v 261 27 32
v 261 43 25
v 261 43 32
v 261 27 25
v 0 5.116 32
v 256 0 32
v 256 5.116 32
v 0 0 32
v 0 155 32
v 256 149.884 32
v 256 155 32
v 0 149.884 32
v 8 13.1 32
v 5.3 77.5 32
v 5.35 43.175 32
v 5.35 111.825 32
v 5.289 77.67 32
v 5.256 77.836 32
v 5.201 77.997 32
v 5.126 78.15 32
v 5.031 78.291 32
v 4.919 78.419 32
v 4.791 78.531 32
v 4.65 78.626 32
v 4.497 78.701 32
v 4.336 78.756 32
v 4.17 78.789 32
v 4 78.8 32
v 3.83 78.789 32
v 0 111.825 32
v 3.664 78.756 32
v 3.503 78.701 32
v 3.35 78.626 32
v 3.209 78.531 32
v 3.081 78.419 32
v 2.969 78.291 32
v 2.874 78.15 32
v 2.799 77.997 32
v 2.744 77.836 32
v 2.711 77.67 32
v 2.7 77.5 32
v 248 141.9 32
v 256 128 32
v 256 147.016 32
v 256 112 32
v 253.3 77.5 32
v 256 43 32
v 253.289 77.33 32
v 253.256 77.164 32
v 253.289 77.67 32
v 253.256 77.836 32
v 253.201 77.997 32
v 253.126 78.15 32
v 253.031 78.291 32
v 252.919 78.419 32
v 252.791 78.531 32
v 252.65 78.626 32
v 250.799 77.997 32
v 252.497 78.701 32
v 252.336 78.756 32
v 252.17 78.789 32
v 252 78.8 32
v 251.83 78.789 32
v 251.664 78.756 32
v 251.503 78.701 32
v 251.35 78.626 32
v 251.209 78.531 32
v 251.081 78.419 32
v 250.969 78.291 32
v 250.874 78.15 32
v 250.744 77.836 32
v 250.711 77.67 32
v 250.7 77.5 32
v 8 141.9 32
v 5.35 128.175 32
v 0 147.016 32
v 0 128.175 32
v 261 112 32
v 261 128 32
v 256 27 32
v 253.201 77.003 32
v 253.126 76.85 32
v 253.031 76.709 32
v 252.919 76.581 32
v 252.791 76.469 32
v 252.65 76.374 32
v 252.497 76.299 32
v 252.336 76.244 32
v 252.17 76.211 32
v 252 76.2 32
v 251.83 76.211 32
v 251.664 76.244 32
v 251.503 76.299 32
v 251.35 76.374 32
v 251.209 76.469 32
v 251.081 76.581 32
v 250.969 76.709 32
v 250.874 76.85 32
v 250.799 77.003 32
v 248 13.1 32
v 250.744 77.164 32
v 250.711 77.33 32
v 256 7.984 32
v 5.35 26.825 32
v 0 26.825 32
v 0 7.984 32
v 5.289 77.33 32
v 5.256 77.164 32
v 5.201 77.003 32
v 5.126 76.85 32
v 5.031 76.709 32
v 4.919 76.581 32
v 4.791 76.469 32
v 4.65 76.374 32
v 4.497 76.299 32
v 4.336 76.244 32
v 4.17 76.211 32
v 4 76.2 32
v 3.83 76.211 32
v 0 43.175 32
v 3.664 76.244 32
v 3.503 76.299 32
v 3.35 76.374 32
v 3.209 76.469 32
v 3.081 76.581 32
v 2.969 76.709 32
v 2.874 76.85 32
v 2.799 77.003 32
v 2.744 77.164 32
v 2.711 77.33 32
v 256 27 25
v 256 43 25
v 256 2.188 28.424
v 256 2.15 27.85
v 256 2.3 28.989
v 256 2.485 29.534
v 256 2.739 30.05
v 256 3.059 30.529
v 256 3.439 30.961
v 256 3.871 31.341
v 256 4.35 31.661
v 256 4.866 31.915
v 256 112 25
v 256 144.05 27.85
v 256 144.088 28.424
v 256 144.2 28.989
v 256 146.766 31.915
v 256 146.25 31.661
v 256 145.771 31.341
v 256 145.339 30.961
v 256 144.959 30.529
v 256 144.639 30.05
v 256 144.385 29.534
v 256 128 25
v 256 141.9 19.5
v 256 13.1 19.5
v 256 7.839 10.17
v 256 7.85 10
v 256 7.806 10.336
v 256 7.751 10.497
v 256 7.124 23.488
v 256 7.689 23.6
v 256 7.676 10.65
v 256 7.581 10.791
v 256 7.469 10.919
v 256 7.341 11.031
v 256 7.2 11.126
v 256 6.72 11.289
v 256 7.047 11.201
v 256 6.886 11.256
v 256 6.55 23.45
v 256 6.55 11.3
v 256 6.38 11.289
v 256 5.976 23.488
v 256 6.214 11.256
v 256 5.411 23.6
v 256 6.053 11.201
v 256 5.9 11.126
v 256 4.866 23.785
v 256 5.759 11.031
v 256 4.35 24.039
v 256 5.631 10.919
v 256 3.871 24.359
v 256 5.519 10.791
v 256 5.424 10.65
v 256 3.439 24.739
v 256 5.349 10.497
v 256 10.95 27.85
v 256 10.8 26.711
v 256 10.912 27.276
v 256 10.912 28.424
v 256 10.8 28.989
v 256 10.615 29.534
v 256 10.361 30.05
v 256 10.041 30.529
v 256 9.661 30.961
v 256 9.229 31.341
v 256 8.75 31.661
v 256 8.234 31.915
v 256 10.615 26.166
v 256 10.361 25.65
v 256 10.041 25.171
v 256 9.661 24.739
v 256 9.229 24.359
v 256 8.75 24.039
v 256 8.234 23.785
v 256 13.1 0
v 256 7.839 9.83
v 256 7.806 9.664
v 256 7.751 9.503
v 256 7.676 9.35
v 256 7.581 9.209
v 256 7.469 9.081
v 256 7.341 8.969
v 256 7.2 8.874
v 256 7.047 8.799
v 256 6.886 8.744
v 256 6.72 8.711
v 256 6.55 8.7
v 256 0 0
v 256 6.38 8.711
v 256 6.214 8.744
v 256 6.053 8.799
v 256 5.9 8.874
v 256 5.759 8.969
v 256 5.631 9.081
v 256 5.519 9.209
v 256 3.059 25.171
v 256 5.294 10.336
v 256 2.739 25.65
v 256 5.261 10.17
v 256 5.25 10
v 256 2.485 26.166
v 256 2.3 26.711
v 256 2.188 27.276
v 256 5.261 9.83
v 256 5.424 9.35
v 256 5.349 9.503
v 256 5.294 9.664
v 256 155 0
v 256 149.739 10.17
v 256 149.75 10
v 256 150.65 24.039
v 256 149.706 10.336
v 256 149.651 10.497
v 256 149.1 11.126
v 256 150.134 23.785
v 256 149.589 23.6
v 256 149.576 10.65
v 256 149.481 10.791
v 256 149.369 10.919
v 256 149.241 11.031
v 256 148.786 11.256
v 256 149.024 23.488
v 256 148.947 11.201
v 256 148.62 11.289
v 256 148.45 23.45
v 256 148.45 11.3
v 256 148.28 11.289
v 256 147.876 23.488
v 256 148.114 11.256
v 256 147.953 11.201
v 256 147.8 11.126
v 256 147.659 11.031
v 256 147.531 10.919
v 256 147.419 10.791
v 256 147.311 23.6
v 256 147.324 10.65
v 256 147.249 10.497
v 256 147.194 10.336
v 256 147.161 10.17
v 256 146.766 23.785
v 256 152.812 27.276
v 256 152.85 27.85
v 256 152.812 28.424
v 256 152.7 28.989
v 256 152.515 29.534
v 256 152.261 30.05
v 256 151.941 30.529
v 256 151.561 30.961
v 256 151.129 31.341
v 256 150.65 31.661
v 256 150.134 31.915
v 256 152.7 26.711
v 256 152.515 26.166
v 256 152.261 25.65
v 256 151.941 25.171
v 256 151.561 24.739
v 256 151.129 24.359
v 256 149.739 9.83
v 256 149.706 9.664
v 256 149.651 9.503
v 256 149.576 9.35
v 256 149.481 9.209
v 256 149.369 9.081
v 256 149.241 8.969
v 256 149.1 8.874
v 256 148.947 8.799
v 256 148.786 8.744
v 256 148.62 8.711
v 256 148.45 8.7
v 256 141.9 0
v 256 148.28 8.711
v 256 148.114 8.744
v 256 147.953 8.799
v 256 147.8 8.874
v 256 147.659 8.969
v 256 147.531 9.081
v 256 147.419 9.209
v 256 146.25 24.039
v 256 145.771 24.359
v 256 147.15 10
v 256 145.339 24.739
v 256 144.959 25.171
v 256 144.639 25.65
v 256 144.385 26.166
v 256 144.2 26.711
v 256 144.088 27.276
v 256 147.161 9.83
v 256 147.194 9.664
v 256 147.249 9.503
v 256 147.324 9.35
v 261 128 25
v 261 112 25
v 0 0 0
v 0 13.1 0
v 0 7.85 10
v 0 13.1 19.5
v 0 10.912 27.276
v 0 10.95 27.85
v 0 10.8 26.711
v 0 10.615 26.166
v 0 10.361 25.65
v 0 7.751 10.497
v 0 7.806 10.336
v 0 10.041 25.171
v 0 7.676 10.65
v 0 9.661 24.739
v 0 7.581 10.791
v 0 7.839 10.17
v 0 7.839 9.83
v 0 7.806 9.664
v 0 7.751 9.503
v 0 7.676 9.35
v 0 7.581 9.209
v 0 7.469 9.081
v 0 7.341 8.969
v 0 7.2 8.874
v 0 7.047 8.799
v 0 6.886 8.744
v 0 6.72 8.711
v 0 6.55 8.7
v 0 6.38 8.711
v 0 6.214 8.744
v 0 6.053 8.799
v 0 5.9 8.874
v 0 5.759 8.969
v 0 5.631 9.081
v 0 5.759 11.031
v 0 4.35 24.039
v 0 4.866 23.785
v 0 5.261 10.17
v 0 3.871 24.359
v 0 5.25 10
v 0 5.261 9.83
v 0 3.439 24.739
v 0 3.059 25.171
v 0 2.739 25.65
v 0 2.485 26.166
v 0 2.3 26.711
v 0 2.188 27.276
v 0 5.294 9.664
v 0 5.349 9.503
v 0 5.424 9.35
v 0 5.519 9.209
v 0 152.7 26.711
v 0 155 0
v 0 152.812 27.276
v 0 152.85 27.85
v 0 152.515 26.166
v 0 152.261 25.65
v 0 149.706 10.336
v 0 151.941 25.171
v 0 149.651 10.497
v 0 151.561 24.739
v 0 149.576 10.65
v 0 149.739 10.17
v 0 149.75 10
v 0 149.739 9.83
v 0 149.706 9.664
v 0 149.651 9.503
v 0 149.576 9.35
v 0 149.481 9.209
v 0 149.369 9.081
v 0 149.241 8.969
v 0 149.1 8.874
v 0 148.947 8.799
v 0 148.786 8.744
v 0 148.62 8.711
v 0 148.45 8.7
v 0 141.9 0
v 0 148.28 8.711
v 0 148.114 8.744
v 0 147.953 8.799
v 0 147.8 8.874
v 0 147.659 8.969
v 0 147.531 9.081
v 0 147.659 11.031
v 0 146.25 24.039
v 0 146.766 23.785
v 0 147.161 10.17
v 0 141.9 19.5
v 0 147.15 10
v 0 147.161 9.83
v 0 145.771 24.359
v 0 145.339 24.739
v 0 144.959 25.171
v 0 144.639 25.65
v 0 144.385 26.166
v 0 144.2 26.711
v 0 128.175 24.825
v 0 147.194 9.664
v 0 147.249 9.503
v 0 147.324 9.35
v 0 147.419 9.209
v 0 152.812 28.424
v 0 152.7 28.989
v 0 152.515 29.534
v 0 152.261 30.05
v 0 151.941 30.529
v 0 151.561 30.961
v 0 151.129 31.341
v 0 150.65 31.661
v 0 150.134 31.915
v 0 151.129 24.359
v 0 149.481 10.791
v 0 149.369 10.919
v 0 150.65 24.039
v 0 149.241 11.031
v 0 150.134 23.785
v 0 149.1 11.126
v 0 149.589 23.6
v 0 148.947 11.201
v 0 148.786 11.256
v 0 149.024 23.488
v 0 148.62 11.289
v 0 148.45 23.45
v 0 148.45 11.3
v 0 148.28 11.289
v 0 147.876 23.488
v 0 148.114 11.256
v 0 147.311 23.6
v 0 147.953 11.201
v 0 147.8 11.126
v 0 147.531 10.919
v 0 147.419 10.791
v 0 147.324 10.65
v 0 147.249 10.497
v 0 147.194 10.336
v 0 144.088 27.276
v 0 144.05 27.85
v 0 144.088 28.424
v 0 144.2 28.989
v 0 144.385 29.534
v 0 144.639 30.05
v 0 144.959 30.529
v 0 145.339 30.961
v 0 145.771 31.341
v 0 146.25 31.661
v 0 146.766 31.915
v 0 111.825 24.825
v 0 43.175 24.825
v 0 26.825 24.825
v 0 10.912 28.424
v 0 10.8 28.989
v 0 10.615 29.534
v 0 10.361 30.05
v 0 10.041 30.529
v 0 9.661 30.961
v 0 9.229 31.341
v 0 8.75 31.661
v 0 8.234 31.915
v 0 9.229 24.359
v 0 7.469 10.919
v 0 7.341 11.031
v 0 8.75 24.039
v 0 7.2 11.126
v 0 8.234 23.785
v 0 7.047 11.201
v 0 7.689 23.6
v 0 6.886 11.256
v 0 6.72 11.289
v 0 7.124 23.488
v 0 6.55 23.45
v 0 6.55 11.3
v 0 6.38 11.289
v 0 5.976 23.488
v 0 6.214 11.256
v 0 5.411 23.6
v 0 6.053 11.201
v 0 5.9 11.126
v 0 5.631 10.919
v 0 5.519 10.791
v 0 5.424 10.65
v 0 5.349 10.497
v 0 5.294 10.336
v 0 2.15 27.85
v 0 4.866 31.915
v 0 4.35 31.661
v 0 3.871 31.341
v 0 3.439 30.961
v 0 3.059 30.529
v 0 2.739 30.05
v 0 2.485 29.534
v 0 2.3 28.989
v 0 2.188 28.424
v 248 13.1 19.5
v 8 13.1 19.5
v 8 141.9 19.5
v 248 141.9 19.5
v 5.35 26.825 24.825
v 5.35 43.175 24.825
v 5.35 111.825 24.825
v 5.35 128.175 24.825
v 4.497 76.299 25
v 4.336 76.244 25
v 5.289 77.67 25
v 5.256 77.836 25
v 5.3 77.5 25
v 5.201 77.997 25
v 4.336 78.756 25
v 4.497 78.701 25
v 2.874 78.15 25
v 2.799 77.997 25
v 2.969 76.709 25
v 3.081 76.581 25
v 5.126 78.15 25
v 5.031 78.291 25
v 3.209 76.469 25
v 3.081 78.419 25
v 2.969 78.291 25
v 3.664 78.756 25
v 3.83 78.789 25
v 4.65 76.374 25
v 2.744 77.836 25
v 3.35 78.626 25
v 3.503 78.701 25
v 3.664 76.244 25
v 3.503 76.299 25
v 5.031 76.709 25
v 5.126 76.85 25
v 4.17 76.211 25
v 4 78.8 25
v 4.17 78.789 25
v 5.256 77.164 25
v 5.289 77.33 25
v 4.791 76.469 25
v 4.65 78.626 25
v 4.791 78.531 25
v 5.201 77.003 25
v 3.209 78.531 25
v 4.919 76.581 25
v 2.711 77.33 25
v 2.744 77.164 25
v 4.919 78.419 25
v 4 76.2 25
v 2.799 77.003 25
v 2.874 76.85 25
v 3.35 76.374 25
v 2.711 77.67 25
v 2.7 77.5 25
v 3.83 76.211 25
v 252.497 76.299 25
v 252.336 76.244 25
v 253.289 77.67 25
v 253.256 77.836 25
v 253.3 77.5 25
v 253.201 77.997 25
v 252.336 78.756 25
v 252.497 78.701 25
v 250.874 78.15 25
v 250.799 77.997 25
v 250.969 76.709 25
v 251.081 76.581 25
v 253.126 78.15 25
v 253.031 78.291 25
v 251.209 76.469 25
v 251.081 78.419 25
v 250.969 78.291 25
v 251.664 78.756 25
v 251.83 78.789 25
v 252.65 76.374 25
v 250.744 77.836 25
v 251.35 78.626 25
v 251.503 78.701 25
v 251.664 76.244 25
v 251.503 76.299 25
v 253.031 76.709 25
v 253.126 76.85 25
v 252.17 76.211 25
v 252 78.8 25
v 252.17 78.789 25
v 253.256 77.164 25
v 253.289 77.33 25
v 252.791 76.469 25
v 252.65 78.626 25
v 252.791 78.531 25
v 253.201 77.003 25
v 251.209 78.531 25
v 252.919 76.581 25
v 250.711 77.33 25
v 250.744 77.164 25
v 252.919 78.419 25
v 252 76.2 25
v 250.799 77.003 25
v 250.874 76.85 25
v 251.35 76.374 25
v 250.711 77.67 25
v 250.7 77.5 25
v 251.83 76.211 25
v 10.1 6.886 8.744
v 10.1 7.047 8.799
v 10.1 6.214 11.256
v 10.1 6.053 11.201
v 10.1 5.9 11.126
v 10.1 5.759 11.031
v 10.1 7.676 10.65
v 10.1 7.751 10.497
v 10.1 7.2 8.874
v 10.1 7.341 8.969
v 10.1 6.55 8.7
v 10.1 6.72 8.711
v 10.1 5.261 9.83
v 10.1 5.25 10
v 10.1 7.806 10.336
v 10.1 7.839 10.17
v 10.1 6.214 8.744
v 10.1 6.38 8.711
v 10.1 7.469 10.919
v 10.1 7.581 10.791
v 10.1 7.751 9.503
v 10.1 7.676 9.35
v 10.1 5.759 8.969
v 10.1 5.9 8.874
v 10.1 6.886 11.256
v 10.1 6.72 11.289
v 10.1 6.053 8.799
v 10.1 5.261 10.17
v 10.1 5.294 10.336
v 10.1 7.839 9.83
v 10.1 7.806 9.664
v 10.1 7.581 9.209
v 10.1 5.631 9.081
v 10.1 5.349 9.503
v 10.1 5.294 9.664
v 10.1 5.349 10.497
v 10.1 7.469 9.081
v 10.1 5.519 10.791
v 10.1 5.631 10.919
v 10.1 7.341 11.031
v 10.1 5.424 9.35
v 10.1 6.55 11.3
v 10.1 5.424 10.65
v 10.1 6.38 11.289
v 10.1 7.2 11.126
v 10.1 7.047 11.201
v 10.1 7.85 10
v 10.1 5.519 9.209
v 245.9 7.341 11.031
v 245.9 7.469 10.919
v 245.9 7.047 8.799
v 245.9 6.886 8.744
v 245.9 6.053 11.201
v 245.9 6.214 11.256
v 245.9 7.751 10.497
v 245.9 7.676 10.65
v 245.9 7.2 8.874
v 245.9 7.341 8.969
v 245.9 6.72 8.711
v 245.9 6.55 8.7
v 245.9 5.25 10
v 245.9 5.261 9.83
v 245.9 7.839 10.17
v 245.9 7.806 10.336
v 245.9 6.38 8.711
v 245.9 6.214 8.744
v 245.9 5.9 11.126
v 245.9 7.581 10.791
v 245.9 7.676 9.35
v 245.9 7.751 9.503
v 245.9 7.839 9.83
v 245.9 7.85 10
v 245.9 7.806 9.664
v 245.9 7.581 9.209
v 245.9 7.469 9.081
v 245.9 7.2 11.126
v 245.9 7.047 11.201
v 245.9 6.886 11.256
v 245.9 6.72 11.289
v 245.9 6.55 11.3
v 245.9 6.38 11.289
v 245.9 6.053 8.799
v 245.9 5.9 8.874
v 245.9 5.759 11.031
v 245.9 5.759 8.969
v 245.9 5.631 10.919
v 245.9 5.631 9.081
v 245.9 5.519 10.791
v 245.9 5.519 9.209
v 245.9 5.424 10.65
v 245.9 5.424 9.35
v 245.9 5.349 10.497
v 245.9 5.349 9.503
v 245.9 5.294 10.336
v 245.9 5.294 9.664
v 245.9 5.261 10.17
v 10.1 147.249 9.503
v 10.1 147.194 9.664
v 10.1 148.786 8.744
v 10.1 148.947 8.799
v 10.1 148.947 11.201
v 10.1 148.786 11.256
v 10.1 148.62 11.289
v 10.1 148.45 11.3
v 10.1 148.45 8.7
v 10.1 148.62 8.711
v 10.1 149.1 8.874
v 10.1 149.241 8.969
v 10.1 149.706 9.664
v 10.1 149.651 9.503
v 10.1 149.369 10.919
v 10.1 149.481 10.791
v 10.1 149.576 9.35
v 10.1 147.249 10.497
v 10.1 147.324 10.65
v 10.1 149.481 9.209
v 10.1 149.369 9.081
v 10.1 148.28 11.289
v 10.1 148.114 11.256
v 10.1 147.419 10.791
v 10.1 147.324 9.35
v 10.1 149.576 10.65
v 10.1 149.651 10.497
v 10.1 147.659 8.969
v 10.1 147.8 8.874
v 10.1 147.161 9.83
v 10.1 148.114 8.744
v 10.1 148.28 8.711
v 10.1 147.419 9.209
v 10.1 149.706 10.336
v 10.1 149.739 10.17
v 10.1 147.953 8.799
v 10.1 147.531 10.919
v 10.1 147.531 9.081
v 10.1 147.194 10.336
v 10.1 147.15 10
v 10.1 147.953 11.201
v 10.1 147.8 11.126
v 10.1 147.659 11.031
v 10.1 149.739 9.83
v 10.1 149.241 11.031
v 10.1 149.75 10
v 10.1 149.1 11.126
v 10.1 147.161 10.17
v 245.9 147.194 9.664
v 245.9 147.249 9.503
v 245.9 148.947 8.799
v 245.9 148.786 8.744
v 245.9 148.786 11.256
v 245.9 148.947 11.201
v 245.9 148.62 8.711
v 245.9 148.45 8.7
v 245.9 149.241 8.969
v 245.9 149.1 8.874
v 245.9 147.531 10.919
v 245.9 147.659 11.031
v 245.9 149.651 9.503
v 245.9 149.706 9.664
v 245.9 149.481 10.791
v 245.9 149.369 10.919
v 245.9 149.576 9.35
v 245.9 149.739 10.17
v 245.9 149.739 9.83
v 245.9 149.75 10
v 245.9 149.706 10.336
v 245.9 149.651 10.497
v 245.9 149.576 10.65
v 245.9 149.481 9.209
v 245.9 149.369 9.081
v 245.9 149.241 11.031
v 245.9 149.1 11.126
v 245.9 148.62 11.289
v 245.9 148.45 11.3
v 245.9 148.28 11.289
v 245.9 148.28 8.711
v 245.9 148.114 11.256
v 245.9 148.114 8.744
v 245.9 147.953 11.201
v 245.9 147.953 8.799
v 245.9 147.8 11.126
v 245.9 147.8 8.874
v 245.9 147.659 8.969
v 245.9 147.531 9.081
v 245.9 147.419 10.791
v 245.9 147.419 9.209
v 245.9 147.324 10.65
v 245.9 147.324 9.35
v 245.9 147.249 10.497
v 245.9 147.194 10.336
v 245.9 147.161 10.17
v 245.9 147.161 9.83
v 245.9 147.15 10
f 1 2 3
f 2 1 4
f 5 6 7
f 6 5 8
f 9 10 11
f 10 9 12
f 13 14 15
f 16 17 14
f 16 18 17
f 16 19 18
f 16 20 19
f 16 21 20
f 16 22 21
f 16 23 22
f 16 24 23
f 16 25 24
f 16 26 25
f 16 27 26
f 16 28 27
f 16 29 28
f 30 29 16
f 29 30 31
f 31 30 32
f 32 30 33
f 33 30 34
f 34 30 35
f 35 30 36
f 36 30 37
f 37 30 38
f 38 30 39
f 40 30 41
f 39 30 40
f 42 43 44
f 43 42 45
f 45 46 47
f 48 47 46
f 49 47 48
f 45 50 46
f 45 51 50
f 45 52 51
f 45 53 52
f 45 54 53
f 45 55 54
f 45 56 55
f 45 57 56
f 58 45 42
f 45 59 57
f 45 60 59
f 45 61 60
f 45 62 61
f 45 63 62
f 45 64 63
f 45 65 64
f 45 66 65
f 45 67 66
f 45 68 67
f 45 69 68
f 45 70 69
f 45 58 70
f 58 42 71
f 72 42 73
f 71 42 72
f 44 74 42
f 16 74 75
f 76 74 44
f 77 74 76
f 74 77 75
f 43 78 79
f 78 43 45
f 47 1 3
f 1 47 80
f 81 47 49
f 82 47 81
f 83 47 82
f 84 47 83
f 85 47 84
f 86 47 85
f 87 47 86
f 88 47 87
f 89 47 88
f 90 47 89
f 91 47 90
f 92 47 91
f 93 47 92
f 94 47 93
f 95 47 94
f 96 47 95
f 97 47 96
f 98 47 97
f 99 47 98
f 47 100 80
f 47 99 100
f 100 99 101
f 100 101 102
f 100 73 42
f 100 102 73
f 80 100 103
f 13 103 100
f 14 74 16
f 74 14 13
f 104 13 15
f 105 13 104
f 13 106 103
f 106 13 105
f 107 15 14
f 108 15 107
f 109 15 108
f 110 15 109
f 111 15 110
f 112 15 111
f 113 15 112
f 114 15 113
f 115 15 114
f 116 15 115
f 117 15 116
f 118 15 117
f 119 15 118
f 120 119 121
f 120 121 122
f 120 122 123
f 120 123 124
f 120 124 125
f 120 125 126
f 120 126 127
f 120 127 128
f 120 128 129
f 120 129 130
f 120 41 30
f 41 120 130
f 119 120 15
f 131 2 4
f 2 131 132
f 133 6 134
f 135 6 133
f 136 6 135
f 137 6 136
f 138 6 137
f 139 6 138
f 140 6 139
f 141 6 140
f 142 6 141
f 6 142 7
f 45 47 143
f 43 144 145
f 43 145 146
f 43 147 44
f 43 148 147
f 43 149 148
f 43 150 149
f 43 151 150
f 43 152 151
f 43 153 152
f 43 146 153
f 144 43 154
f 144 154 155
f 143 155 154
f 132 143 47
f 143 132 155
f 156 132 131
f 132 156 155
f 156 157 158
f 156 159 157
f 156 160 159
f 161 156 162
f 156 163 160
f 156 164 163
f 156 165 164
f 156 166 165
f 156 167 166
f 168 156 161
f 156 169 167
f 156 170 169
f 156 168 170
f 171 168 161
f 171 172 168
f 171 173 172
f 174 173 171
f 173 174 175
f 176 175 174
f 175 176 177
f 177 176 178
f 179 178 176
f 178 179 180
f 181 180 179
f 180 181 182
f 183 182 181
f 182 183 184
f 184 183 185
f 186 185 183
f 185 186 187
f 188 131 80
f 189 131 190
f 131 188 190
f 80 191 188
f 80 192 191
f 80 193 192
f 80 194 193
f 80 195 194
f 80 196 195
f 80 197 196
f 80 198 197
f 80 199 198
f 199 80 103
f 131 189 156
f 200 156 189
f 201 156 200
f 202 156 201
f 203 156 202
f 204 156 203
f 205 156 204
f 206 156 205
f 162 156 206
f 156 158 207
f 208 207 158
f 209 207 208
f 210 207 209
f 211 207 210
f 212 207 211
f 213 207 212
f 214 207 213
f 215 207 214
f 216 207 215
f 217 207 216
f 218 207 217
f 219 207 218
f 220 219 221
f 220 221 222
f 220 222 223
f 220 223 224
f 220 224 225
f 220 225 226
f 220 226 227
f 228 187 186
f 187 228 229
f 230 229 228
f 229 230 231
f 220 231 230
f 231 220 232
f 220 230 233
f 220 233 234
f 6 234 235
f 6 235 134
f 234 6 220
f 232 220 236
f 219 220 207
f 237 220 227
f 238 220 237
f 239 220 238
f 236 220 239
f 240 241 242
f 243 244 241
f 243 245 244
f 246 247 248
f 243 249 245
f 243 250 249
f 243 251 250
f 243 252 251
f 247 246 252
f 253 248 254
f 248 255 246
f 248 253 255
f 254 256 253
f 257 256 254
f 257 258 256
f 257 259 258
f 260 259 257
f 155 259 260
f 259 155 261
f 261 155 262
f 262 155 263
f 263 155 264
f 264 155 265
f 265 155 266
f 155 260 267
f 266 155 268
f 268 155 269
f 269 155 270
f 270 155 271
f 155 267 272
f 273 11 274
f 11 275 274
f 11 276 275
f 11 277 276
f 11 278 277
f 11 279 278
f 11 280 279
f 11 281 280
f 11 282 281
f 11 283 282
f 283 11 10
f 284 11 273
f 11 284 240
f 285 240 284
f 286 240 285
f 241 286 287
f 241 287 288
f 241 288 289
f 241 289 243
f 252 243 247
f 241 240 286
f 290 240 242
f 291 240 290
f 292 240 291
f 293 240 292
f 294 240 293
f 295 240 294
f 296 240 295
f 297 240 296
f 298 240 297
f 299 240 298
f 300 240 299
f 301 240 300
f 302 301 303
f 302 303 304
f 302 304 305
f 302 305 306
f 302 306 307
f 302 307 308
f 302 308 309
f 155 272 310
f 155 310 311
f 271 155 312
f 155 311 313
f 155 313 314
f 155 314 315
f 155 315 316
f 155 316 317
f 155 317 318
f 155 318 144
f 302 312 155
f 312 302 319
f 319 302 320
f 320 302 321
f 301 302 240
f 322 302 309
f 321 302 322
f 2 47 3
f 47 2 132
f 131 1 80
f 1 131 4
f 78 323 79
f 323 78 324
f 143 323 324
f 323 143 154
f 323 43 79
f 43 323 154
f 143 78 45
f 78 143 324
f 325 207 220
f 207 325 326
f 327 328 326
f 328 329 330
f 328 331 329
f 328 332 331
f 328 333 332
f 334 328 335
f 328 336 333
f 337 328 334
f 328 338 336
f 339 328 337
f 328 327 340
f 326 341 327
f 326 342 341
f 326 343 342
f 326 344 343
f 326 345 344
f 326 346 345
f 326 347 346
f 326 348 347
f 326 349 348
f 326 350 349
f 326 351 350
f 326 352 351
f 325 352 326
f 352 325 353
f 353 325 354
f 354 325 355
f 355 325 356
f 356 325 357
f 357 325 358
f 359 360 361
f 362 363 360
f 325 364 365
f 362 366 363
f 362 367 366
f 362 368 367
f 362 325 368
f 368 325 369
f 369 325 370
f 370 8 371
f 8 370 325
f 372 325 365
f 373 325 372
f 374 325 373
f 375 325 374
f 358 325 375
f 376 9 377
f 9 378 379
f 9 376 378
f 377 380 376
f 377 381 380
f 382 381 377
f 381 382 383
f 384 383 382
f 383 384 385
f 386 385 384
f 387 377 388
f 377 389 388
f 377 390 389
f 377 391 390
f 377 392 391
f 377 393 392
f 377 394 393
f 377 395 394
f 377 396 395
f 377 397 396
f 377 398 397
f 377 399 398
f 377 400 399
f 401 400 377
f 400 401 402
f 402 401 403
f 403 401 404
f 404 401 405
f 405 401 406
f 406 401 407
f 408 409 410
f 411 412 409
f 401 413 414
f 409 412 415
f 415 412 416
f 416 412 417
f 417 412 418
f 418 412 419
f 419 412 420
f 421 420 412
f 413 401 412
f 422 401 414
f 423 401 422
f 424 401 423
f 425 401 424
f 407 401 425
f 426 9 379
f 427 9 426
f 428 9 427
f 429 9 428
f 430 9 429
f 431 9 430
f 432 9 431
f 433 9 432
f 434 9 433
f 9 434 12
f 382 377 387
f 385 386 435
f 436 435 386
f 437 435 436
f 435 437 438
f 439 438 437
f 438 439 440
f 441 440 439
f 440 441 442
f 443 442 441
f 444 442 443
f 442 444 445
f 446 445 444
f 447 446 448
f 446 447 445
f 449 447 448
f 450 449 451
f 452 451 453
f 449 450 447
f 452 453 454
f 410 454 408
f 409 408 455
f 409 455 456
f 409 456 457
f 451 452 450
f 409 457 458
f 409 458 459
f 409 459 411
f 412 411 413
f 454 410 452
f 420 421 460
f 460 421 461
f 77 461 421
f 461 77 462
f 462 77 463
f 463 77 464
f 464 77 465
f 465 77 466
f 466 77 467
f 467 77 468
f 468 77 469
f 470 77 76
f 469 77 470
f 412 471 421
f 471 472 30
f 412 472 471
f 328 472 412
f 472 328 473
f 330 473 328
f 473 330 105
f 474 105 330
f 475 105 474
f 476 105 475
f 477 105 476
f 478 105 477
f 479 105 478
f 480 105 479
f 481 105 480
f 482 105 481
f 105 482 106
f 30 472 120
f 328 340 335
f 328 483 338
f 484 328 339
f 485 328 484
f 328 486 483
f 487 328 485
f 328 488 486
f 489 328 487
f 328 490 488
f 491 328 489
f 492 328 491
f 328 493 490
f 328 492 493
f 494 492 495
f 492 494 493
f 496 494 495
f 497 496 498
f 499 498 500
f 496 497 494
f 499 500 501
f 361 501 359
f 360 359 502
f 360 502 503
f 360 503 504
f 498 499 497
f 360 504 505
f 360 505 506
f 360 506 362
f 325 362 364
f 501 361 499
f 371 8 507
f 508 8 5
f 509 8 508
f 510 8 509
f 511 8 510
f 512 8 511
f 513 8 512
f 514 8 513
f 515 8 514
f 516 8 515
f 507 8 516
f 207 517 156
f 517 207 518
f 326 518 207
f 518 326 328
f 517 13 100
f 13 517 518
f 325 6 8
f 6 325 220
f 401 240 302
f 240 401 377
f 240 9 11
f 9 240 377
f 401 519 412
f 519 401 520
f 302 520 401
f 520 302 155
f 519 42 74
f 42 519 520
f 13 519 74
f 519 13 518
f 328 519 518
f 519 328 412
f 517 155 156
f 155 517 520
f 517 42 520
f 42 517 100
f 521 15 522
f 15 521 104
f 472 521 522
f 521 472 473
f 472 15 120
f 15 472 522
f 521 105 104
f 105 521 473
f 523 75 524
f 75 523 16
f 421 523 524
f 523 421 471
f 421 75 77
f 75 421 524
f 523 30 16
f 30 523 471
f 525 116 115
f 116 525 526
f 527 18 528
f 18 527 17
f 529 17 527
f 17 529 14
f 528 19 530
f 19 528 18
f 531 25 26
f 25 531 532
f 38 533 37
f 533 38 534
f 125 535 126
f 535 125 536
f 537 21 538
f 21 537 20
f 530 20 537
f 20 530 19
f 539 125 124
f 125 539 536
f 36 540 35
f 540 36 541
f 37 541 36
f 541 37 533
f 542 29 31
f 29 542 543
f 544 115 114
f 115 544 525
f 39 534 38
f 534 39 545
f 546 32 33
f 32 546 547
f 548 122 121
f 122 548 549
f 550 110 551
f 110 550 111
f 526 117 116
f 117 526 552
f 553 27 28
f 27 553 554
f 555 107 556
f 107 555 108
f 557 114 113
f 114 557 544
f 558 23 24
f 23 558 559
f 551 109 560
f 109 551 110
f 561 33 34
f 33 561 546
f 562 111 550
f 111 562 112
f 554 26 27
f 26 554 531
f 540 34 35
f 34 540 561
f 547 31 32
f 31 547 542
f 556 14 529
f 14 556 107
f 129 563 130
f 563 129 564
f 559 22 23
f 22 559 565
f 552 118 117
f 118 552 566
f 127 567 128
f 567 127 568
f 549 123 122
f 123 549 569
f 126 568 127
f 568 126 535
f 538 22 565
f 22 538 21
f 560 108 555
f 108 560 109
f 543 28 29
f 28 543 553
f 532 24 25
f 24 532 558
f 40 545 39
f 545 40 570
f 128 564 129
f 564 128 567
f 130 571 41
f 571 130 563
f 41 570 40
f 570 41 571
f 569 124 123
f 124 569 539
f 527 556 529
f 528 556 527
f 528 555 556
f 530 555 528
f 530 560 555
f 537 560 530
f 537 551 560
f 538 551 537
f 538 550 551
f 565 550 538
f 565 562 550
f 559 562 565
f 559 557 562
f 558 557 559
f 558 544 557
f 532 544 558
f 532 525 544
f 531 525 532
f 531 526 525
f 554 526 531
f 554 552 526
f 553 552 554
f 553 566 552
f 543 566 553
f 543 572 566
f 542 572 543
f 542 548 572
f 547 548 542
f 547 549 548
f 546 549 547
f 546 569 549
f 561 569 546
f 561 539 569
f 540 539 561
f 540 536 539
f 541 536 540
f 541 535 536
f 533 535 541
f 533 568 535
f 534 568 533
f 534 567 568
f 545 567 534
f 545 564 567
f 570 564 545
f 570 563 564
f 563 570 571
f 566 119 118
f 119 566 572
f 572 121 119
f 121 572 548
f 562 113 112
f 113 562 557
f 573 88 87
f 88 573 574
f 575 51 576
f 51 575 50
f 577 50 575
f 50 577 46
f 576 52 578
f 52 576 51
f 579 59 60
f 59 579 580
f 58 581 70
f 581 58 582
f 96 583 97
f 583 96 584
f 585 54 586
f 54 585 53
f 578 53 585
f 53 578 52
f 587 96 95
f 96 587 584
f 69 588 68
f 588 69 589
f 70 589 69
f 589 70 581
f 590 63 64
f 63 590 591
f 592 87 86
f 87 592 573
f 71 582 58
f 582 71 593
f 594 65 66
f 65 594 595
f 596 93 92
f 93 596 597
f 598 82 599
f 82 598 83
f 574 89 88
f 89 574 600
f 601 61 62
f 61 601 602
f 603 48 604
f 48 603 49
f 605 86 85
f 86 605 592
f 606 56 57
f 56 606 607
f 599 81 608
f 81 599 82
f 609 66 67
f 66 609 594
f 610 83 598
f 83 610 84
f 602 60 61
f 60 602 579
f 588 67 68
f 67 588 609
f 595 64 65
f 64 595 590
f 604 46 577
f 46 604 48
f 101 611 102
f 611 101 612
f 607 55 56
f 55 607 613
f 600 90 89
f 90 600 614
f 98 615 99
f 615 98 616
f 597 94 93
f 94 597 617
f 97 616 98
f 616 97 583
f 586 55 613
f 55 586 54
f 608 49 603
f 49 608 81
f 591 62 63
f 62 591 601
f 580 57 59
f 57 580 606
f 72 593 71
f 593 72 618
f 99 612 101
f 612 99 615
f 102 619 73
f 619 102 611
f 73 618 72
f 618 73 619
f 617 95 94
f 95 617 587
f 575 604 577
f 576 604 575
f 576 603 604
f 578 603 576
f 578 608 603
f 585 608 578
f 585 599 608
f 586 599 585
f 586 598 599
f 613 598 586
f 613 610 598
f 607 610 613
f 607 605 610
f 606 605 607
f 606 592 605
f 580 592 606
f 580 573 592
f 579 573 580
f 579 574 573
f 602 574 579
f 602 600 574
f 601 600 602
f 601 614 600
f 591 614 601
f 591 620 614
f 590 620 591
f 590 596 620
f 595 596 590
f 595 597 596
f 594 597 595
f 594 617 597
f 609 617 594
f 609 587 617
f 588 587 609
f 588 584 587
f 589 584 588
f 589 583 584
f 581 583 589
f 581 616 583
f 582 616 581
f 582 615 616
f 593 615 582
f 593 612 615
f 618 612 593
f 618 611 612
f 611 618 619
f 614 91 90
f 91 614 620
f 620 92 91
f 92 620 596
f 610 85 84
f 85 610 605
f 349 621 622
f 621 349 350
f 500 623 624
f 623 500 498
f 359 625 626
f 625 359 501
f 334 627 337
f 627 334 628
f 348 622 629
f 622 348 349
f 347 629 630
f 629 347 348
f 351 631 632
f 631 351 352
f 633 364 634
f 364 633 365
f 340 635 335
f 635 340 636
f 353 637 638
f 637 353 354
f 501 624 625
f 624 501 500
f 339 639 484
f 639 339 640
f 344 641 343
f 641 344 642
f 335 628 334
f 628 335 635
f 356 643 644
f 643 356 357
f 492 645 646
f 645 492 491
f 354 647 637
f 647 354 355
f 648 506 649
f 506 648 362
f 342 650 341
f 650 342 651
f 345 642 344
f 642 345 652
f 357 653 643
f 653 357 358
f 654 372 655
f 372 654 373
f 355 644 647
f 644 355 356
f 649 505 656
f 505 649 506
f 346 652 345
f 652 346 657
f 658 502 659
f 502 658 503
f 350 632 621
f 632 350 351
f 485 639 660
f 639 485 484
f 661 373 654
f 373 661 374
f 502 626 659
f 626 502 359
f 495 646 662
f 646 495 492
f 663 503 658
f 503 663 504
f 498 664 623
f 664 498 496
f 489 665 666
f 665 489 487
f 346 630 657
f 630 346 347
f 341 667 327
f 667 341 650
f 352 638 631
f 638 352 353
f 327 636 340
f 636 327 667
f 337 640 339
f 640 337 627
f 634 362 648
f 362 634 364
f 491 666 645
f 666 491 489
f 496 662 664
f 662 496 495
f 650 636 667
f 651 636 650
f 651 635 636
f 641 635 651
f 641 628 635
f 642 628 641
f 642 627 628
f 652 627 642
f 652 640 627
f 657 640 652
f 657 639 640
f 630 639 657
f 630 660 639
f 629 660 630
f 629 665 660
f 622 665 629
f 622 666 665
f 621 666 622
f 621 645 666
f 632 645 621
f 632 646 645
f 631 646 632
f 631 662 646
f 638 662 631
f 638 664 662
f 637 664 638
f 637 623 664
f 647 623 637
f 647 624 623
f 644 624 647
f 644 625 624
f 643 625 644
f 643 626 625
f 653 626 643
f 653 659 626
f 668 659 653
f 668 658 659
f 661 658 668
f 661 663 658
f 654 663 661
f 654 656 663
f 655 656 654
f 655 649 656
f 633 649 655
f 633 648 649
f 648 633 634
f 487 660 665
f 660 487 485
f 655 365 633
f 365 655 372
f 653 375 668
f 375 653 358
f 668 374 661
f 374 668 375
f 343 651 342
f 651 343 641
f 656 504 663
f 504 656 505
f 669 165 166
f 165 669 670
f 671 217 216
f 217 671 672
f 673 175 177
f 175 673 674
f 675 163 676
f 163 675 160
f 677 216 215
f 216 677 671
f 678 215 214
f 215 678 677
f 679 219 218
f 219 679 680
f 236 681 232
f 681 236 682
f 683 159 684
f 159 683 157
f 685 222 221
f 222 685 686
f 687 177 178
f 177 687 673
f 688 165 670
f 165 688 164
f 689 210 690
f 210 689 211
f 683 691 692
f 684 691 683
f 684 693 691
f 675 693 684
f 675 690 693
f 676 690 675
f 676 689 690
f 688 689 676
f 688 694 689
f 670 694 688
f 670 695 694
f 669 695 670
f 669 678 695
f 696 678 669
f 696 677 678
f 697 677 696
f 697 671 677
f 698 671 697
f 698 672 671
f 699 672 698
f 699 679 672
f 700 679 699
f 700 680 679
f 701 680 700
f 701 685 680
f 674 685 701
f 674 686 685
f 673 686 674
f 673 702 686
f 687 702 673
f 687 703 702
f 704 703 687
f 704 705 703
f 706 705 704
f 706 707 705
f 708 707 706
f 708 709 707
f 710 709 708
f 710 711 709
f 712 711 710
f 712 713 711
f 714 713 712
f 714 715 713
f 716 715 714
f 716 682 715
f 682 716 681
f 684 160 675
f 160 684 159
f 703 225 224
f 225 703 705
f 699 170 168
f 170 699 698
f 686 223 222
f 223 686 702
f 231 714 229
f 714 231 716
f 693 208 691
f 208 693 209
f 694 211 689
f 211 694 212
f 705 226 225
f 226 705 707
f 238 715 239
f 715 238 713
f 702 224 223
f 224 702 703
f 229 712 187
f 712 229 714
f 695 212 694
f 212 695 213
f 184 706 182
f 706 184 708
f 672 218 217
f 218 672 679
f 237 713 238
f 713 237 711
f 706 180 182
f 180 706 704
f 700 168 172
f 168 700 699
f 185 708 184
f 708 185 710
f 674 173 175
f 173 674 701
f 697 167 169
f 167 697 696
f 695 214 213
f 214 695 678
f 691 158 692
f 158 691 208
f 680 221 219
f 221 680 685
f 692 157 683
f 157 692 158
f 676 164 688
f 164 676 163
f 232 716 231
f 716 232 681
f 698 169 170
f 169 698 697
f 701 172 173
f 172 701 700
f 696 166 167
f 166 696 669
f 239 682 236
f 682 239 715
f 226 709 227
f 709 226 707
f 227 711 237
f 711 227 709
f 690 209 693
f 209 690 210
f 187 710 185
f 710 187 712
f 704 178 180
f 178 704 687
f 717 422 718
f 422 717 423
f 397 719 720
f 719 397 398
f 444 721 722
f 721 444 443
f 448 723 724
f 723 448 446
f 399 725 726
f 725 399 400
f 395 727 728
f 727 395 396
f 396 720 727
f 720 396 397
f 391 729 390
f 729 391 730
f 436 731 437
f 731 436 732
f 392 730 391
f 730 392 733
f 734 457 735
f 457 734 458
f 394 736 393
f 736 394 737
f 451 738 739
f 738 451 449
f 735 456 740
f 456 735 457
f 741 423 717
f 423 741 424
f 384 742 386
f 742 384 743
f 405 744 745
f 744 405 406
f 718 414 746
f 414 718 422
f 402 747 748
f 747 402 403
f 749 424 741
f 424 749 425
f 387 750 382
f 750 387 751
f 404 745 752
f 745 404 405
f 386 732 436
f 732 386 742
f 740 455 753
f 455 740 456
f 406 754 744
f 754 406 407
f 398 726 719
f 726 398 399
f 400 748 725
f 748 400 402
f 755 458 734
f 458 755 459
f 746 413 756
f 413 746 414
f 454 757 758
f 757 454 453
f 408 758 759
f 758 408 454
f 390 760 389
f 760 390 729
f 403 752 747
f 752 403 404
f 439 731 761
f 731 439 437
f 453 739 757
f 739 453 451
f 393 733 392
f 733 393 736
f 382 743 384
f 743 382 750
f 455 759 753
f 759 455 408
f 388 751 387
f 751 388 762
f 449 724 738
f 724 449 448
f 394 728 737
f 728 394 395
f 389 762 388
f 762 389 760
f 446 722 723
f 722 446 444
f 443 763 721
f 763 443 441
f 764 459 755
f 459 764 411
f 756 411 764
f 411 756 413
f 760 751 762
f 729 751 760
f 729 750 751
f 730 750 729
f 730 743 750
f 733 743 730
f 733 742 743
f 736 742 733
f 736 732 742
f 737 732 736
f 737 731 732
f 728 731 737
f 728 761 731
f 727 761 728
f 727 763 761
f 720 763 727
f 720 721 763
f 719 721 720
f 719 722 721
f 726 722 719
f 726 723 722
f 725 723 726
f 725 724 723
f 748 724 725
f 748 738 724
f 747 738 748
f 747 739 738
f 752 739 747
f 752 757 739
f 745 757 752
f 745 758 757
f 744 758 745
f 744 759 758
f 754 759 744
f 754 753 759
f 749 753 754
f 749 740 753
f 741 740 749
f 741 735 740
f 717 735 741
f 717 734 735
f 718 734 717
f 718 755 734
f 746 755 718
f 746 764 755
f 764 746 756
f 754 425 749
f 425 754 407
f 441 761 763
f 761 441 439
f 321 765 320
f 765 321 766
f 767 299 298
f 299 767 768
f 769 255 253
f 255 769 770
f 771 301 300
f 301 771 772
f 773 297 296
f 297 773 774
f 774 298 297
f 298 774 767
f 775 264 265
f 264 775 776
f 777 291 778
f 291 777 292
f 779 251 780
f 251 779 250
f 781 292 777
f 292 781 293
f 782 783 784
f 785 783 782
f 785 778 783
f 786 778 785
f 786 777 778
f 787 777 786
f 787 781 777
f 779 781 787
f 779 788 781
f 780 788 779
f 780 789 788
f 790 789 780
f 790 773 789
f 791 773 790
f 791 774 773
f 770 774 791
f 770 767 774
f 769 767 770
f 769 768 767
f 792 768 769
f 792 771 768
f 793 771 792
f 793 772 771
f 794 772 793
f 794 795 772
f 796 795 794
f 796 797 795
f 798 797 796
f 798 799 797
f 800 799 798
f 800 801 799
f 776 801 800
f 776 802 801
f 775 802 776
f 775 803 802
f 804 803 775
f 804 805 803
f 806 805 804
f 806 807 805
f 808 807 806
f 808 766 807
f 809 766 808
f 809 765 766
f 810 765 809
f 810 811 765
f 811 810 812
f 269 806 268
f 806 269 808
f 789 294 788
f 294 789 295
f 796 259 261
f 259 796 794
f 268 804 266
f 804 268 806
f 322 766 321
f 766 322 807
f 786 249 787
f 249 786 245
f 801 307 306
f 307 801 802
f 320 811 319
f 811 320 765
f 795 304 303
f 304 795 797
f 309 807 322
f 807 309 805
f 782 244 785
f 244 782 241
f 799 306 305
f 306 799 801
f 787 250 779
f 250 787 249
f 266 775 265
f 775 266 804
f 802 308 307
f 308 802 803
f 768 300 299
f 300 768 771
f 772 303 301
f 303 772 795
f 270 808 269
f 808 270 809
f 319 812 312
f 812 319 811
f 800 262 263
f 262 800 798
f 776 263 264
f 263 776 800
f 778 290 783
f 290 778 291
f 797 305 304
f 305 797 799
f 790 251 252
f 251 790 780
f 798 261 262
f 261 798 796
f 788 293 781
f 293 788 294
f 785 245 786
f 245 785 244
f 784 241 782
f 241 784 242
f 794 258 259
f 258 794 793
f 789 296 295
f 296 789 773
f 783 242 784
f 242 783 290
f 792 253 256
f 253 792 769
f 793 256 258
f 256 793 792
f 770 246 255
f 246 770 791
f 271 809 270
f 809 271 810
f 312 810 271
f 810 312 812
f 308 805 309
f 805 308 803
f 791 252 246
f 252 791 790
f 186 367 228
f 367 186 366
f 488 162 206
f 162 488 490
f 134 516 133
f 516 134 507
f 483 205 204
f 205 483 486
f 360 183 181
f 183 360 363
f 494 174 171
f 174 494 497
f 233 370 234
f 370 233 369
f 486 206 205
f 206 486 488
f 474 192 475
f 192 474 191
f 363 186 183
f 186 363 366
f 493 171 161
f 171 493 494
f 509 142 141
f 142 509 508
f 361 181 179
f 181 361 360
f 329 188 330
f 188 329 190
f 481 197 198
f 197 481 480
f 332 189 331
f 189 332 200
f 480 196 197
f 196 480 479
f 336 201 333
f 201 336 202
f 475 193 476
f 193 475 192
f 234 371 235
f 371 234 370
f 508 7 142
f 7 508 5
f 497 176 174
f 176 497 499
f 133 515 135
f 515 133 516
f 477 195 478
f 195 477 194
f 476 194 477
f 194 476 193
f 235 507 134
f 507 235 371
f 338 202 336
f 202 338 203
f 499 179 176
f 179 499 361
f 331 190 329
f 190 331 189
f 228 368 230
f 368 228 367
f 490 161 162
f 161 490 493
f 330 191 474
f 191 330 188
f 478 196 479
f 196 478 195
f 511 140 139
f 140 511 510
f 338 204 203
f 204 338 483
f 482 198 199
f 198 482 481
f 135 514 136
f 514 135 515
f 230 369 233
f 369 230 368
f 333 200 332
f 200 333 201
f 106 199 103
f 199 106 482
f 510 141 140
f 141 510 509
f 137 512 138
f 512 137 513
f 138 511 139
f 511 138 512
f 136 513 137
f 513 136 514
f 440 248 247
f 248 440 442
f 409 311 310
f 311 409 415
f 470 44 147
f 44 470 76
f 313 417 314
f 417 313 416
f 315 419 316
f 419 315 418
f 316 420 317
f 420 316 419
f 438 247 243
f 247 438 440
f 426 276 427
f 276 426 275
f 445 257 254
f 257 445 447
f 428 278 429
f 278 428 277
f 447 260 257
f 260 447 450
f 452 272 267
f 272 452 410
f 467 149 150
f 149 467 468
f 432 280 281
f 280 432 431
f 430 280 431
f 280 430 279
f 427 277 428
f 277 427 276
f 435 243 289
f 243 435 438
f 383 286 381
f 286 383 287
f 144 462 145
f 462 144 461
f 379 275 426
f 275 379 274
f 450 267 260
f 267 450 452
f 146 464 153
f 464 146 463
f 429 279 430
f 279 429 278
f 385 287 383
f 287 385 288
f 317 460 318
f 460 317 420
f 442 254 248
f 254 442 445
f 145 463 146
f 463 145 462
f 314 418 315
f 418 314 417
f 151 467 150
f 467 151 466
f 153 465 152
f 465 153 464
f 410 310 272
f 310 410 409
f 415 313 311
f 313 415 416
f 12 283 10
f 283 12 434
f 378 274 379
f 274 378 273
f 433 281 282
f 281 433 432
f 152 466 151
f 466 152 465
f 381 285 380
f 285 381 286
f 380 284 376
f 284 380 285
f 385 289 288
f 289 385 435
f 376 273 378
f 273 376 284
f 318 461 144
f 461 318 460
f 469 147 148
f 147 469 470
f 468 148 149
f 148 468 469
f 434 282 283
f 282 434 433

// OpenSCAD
// LED matrix side-loading enclosure v2
// Concept fit model for 4 x 256x128 mm LED modules, 2 x 1000mm x 8mm steel reinforcement bars.
// All dimensions in mm.
// IMPORTANT: panel thickness and edge clearances are assumptions until measured on the real LED module.

$fn = 48;
part = "frame";

// ---- primary dimensions ----
module_pitch = 256;          // one printed structural module per LED panel
panel_w = 256;
panel_h = 128;
panel_edge_t = 16.0;        // ASSUMPTION: maximum edge/backing thickness in guide region
panel_z_clear = 0.8;
panel_y_clear = 0.8;

outer_h = 155;
depth = 32;
rail_h = (outer_h - (panel_h + panel_y_clear))/2; // 13.1 mm
stile_w = 8;
back_stile_z = 19.5;        // stiles live behind slide path

// panel slide path / lips
panel_z0 = 1.8;
panel_z1 = panel_z0 + panel_edge_t + panel_z_clear;
lip_inset_y = 1.8;
lip_z = 1.8;
rear_lip_z = 2.4;

// 8 mm bar channel
rod_d = 8.0;
rod_channel_d = 8.8;        // 0.8 mm diametral clearance (0.4 mm radial)
rod_r = rod_channel_d/2;
rod_center_z = depth - rod_r + 0.25; // opens slightly to rear for drop-in assembly
rod_center_y_bottom = rail_h/2;
rod_center_y_top = outer_h - rail_h/2;

// module interlock tabs on rear stiles
join_len = 5.0;
join_clear = 0.35;
join_w_y = 16;
join_h_z = 7;
join_y1 = 27;
join_y2 = outer_h - 27 - join_w_y;
join_z = depth - join_h_z;

// fasteners
m3_clear = 3.4;
m3_pilot = 2.6;
m4_clear = 4.4;

// utility
module cyl_x(len, d) {
    rotate([0,90,0]) cylinder(h=len, d=d, center=false);
}

// Main printable module. Pitch remains exactly 256 mm when joined.
module frame_module() {
    difference() {
        union() {
            cube([module_pitch, rail_h, depth]);
            translate([0, outer_h-rail_h, 0]) cube([module_pitch, rail_h, depth]);

            translate([0, rail_h, back_stile_z])
                cube([stile_w, outer_h-2*rail_h, depth-back_stile_z]);
            translate([module_pitch-stile_w, rail_h, back_stile_z])
                cube([stile_w, outer_h-2*rail_h, depth-back_stile_z]);

            translate([0, rail_h-2.0, back_stile_z]) cube([module_pitch, 2.0, depth-back_stile_z]);
            translate([0, outer_h-rail_h, back_stile_z]) cube([module_pitch, 2.0, depth-back_stile_z]);

            translate([0, rail_h-lip_inset_y, 0]) cube([module_pitch, lip_inset_y, lip_z]);
            translate([0, outer_h-rail_h, 0]) cube([module_pitch, lip_inset_y, lip_z]);

            translate([0, rail_h-lip_inset_y, panel_z1]) cube([module_pitch, lip_inset_y, rear_lip_z]);
            translate([0, outer_h-rail_h, panel_z1]) cube([module_pitch, lip_inset_y, rear_lip_z]);

            for (yy=[join_y1, join_y2])
                translate([module_pitch, yy, join_z])
                    cube([join_len, join_w_y, join_h_z]);
        }

        translate([-0.1, rod_center_y_bottom, rod_center_z]) cyl_x(module_pitch+0.2, rod_channel_d);
        translate([-0.1, rod_center_y_top, rod_center_z]) cyl_x(module_pitch+0.2, rod_channel_d);

        for (yy=[join_y1-join_clear/2, join_y2-join_clear/2])
            translate([-0.1, yy, join_z-join_clear/2])
                cube([join_len+join_clear+0.1, join_w_y+join_clear, join_h_z+join_clear]);

        for (xx=[4, module_pitch-4])
            translate([xx, outer_h/2, depth-7]) cylinder(h=8, d=m3_pilot);

        for (yy=[rod_center_y_bottom, rod_center_y_top]) {
            for (xx=[module_pitch/2-8, module_pitch/2+8])
                translate([xx, yy, depth-7]) cylinder(h=8, d=m3_pilot);
        }

        for (xx=[48, 80, 176, 208])
            for (yy=[outer_h/2-24, outer_h/2+24])
                translate([xx, yy, depth-7]) cylinder(h=8, d=m3_pilot);

        for (yy=[rod_center_y_bottom, rod_center_y_top]) {
            translate([-0.1, yy, 10]) rotate([0,90,0]) cylinder(h=10.2,d=m3_pilot);
            translate([module_pitch-10.1, yy, 10]) rotate([0,90,0]) cylinder(h=10.2,d=m3_pilot);
        }
    }
}

module left_end_cap() {
    cap_t = 5;
    band_h = rail_h + 5;
    spine_z = 4;
    difference() {
        union() {
            cube([cap_t, band_h, depth]);
            translate([0, outer_h-band_h, 0]) cube([cap_t, band_h, depth]);
            cube([cap_t, outer_h, spine_z]);
            for (yy=[rod_center_y_bottom, rod_center_y_top])
                translate([cap_t-0.5, yy, rod_center_z]) cyl_x(12.5, 7.6);
        }
        for (yy=[rod_center_y_bottom, rod_center_y_top])
            translate([-0.1,yy,10]) rotate([0,90,0]) cylinder(h=cap_t+0.2,d=m3_clear);
    }
}

module right_end_cap() {
    cap_t = 5;
    band_h = rail_h + 5;
    spine_z = 4;
    difference() {
        union() {
            cube([cap_t, band_h, depth]);
            translate([0, outer_h-band_h, 0]) cube([cap_t, band_h, depth]);
            cube([cap_t, outer_h, spine_z]);
            for (yy=[rod_center_y_bottom, rod_center_y_top])
                translate([-12, yy, rod_center_z]) cyl_x(12.5, 7.6);
        }
        for (yy=[rod_center_y_bottom, rod_center_y_top])
            translate([-0.1,yy,10]) rotate([0,90,0]) cylinder(h=cap_t+0.2,d=m3_clear);
    }
}

module rod_retainer_clip() {
    clip_x = 24;
    clip_y = 12;
    clip_z = 3;
    difference() {
        cube([clip_x, clip_y, clip_z]);
        translate([clip_x/2, clip_y/2, -1.2]) cylinder(h=2.4, d=8.6);
        for (xx=[4, clip_x-4])
            translate([xx, clip_y/2, -0.1]) cylinder(h=clip_z+0.2, d=m3_clear);
    }
}

module seam_lock() {
    w=34; h=28; t=4; finger_w=1.2; finger_h=12; finger_d=8;
    difference() {
        union() {
            cube([w,h,t]);
            translate([w/2-finger_w/2, h/2-finger_h/2, -finger_d]) cube([finger_w,finger_h,finger_d]);
        }
        for (xx=[13,w-13])
            translate([xx,h/2,-0.1]) cylinder(h=t+0.2,d=m3_clear);
    }
}

module controller_tray() {
    w=98; h=62; t=3; boss=7; boss_h=5;
    difference() {
        union() {
            cube([w,h,t]);
            for (x=[8,w-8]) for (y=[8,h-8])
                translate([x,y,t]) cylinder(h=boss_h,d=boss);
        }
        for (x=[6,w-6]) for (y=[6,h-6])
            translate([x,y,-0.1]) cylinder(h=t+boss_h+0.2,d=m3_clear);
        for (x=[24,w-24]) for (y=[18,h-18])
            hull() {
                translate([x-3,y,-0.1]) cylinder(h=t+boss_h+0.2,d=3.0);
                translate([x+3,y,-0.1]) cylinder(h=t+boss_h+0.2,d=3.0);
            }
        translate([w/2-24,h/2-12,-0.1]) cube([48,24,t+0.2]);
    }
}

module power_tray() {
    w=112; h=68; t=3; rim=3;
    difference() {
        union() {
            cube([w,h,t]);
            cube([w,rim,8]);
            translate([0,h-rim,0]) cube([w,rim,8]);
            cube([rim,h,8]);
            translate([w-rim,0,0]) cube([rim,h,8]);
        }
        for (x=[7,w-7]) for (y=[7,h-7])
            translate([x,y,-0.1]) cylinder(h=8.2,d=m3_clear);
        for (x=[28,56,84])
            hull() {
                translate([x-5,h/2,-0.1]) cylinder(h=t+0.2,d=3.5);
                translate([x+5,h/2,-0.1]) cylinder(h=t+0.2,d=3.5);
            }
        translate([w-22,h/2-8,-0.1]) cube([16,16,t+0.2]);
    }
}

module cable_clip() {
    w=16; h=10; t=5;
    difference() {
        cube([w,h,t]);
        translate([w/2,h/2,t]) rotate([90,0,0]) cylinder(h=h+0.2,d=5.2,center=true);
        translate([3,h/2,-0.1]) cylinder(h=t+0.2,d=m3_clear);
    }
}

module thickness_gauge() {
    base_w=100; base_h=28; base_t=8;
    vals=[10,12,14,16,18];
    difference() {
        cube([base_w,base_h,base_t]);
        for(i=[0:4]) {
            x=4+i*19;
            translate([x,10,-0.1]) cube([vals[i]+0.6,18.2,base_t+0.2]);
        }
    }
}

module joint_coupon() {
    difference() {
        union() {
            cube([35,24,10]);
            translate([35,4,3]) cube([join_len,16,7]);
        }
        translate([-0.1,4-join_clear/2,3-join_clear/2]) cube([join_len+join_clear,16+join_clear,7+join_clear]);
    }
}

module assembly_reference(exploded=0) {
    for(i=[0:3])
        translate([i*module_pitch + i*exploded,0,0]) frame_module();
    translate([-5-exploded,0,0]) left_end_cap();
    translate([4*module_pitch+exploded*4,0,0]) right_end_cap();
    color("silver") {
        translate([12,rod_center_y_bottom,rod_center_z]) cyl_x(1000,rod_d);
        translate([12,rod_center_y_top,rod_center_z]) cyl_x(1000,rod_d);
    }
}

// ---- dispatch ----
if (part=="frame") frame_module();
else if (part=="left_cap") left_end_cap();
else if (part=="right_cap") right_end_cap();
else if (part=="rod_clip") rod_retainer_clip();
else if (part=="seam_lock") seam_lock();
else if (part=="controller_tray") controller_tray();
else if (part=="power_tray") power_tray();
else if (part=="cable_clip") cable_clip();
else if (part=="thickness_gauge") thickness_gauge();
else if (part=="joint_coupon") joint_coupon();
else if (part=="assembly") assembly_reference(0);
else if (part=="assembly_exploded") assembly_reference(12);
